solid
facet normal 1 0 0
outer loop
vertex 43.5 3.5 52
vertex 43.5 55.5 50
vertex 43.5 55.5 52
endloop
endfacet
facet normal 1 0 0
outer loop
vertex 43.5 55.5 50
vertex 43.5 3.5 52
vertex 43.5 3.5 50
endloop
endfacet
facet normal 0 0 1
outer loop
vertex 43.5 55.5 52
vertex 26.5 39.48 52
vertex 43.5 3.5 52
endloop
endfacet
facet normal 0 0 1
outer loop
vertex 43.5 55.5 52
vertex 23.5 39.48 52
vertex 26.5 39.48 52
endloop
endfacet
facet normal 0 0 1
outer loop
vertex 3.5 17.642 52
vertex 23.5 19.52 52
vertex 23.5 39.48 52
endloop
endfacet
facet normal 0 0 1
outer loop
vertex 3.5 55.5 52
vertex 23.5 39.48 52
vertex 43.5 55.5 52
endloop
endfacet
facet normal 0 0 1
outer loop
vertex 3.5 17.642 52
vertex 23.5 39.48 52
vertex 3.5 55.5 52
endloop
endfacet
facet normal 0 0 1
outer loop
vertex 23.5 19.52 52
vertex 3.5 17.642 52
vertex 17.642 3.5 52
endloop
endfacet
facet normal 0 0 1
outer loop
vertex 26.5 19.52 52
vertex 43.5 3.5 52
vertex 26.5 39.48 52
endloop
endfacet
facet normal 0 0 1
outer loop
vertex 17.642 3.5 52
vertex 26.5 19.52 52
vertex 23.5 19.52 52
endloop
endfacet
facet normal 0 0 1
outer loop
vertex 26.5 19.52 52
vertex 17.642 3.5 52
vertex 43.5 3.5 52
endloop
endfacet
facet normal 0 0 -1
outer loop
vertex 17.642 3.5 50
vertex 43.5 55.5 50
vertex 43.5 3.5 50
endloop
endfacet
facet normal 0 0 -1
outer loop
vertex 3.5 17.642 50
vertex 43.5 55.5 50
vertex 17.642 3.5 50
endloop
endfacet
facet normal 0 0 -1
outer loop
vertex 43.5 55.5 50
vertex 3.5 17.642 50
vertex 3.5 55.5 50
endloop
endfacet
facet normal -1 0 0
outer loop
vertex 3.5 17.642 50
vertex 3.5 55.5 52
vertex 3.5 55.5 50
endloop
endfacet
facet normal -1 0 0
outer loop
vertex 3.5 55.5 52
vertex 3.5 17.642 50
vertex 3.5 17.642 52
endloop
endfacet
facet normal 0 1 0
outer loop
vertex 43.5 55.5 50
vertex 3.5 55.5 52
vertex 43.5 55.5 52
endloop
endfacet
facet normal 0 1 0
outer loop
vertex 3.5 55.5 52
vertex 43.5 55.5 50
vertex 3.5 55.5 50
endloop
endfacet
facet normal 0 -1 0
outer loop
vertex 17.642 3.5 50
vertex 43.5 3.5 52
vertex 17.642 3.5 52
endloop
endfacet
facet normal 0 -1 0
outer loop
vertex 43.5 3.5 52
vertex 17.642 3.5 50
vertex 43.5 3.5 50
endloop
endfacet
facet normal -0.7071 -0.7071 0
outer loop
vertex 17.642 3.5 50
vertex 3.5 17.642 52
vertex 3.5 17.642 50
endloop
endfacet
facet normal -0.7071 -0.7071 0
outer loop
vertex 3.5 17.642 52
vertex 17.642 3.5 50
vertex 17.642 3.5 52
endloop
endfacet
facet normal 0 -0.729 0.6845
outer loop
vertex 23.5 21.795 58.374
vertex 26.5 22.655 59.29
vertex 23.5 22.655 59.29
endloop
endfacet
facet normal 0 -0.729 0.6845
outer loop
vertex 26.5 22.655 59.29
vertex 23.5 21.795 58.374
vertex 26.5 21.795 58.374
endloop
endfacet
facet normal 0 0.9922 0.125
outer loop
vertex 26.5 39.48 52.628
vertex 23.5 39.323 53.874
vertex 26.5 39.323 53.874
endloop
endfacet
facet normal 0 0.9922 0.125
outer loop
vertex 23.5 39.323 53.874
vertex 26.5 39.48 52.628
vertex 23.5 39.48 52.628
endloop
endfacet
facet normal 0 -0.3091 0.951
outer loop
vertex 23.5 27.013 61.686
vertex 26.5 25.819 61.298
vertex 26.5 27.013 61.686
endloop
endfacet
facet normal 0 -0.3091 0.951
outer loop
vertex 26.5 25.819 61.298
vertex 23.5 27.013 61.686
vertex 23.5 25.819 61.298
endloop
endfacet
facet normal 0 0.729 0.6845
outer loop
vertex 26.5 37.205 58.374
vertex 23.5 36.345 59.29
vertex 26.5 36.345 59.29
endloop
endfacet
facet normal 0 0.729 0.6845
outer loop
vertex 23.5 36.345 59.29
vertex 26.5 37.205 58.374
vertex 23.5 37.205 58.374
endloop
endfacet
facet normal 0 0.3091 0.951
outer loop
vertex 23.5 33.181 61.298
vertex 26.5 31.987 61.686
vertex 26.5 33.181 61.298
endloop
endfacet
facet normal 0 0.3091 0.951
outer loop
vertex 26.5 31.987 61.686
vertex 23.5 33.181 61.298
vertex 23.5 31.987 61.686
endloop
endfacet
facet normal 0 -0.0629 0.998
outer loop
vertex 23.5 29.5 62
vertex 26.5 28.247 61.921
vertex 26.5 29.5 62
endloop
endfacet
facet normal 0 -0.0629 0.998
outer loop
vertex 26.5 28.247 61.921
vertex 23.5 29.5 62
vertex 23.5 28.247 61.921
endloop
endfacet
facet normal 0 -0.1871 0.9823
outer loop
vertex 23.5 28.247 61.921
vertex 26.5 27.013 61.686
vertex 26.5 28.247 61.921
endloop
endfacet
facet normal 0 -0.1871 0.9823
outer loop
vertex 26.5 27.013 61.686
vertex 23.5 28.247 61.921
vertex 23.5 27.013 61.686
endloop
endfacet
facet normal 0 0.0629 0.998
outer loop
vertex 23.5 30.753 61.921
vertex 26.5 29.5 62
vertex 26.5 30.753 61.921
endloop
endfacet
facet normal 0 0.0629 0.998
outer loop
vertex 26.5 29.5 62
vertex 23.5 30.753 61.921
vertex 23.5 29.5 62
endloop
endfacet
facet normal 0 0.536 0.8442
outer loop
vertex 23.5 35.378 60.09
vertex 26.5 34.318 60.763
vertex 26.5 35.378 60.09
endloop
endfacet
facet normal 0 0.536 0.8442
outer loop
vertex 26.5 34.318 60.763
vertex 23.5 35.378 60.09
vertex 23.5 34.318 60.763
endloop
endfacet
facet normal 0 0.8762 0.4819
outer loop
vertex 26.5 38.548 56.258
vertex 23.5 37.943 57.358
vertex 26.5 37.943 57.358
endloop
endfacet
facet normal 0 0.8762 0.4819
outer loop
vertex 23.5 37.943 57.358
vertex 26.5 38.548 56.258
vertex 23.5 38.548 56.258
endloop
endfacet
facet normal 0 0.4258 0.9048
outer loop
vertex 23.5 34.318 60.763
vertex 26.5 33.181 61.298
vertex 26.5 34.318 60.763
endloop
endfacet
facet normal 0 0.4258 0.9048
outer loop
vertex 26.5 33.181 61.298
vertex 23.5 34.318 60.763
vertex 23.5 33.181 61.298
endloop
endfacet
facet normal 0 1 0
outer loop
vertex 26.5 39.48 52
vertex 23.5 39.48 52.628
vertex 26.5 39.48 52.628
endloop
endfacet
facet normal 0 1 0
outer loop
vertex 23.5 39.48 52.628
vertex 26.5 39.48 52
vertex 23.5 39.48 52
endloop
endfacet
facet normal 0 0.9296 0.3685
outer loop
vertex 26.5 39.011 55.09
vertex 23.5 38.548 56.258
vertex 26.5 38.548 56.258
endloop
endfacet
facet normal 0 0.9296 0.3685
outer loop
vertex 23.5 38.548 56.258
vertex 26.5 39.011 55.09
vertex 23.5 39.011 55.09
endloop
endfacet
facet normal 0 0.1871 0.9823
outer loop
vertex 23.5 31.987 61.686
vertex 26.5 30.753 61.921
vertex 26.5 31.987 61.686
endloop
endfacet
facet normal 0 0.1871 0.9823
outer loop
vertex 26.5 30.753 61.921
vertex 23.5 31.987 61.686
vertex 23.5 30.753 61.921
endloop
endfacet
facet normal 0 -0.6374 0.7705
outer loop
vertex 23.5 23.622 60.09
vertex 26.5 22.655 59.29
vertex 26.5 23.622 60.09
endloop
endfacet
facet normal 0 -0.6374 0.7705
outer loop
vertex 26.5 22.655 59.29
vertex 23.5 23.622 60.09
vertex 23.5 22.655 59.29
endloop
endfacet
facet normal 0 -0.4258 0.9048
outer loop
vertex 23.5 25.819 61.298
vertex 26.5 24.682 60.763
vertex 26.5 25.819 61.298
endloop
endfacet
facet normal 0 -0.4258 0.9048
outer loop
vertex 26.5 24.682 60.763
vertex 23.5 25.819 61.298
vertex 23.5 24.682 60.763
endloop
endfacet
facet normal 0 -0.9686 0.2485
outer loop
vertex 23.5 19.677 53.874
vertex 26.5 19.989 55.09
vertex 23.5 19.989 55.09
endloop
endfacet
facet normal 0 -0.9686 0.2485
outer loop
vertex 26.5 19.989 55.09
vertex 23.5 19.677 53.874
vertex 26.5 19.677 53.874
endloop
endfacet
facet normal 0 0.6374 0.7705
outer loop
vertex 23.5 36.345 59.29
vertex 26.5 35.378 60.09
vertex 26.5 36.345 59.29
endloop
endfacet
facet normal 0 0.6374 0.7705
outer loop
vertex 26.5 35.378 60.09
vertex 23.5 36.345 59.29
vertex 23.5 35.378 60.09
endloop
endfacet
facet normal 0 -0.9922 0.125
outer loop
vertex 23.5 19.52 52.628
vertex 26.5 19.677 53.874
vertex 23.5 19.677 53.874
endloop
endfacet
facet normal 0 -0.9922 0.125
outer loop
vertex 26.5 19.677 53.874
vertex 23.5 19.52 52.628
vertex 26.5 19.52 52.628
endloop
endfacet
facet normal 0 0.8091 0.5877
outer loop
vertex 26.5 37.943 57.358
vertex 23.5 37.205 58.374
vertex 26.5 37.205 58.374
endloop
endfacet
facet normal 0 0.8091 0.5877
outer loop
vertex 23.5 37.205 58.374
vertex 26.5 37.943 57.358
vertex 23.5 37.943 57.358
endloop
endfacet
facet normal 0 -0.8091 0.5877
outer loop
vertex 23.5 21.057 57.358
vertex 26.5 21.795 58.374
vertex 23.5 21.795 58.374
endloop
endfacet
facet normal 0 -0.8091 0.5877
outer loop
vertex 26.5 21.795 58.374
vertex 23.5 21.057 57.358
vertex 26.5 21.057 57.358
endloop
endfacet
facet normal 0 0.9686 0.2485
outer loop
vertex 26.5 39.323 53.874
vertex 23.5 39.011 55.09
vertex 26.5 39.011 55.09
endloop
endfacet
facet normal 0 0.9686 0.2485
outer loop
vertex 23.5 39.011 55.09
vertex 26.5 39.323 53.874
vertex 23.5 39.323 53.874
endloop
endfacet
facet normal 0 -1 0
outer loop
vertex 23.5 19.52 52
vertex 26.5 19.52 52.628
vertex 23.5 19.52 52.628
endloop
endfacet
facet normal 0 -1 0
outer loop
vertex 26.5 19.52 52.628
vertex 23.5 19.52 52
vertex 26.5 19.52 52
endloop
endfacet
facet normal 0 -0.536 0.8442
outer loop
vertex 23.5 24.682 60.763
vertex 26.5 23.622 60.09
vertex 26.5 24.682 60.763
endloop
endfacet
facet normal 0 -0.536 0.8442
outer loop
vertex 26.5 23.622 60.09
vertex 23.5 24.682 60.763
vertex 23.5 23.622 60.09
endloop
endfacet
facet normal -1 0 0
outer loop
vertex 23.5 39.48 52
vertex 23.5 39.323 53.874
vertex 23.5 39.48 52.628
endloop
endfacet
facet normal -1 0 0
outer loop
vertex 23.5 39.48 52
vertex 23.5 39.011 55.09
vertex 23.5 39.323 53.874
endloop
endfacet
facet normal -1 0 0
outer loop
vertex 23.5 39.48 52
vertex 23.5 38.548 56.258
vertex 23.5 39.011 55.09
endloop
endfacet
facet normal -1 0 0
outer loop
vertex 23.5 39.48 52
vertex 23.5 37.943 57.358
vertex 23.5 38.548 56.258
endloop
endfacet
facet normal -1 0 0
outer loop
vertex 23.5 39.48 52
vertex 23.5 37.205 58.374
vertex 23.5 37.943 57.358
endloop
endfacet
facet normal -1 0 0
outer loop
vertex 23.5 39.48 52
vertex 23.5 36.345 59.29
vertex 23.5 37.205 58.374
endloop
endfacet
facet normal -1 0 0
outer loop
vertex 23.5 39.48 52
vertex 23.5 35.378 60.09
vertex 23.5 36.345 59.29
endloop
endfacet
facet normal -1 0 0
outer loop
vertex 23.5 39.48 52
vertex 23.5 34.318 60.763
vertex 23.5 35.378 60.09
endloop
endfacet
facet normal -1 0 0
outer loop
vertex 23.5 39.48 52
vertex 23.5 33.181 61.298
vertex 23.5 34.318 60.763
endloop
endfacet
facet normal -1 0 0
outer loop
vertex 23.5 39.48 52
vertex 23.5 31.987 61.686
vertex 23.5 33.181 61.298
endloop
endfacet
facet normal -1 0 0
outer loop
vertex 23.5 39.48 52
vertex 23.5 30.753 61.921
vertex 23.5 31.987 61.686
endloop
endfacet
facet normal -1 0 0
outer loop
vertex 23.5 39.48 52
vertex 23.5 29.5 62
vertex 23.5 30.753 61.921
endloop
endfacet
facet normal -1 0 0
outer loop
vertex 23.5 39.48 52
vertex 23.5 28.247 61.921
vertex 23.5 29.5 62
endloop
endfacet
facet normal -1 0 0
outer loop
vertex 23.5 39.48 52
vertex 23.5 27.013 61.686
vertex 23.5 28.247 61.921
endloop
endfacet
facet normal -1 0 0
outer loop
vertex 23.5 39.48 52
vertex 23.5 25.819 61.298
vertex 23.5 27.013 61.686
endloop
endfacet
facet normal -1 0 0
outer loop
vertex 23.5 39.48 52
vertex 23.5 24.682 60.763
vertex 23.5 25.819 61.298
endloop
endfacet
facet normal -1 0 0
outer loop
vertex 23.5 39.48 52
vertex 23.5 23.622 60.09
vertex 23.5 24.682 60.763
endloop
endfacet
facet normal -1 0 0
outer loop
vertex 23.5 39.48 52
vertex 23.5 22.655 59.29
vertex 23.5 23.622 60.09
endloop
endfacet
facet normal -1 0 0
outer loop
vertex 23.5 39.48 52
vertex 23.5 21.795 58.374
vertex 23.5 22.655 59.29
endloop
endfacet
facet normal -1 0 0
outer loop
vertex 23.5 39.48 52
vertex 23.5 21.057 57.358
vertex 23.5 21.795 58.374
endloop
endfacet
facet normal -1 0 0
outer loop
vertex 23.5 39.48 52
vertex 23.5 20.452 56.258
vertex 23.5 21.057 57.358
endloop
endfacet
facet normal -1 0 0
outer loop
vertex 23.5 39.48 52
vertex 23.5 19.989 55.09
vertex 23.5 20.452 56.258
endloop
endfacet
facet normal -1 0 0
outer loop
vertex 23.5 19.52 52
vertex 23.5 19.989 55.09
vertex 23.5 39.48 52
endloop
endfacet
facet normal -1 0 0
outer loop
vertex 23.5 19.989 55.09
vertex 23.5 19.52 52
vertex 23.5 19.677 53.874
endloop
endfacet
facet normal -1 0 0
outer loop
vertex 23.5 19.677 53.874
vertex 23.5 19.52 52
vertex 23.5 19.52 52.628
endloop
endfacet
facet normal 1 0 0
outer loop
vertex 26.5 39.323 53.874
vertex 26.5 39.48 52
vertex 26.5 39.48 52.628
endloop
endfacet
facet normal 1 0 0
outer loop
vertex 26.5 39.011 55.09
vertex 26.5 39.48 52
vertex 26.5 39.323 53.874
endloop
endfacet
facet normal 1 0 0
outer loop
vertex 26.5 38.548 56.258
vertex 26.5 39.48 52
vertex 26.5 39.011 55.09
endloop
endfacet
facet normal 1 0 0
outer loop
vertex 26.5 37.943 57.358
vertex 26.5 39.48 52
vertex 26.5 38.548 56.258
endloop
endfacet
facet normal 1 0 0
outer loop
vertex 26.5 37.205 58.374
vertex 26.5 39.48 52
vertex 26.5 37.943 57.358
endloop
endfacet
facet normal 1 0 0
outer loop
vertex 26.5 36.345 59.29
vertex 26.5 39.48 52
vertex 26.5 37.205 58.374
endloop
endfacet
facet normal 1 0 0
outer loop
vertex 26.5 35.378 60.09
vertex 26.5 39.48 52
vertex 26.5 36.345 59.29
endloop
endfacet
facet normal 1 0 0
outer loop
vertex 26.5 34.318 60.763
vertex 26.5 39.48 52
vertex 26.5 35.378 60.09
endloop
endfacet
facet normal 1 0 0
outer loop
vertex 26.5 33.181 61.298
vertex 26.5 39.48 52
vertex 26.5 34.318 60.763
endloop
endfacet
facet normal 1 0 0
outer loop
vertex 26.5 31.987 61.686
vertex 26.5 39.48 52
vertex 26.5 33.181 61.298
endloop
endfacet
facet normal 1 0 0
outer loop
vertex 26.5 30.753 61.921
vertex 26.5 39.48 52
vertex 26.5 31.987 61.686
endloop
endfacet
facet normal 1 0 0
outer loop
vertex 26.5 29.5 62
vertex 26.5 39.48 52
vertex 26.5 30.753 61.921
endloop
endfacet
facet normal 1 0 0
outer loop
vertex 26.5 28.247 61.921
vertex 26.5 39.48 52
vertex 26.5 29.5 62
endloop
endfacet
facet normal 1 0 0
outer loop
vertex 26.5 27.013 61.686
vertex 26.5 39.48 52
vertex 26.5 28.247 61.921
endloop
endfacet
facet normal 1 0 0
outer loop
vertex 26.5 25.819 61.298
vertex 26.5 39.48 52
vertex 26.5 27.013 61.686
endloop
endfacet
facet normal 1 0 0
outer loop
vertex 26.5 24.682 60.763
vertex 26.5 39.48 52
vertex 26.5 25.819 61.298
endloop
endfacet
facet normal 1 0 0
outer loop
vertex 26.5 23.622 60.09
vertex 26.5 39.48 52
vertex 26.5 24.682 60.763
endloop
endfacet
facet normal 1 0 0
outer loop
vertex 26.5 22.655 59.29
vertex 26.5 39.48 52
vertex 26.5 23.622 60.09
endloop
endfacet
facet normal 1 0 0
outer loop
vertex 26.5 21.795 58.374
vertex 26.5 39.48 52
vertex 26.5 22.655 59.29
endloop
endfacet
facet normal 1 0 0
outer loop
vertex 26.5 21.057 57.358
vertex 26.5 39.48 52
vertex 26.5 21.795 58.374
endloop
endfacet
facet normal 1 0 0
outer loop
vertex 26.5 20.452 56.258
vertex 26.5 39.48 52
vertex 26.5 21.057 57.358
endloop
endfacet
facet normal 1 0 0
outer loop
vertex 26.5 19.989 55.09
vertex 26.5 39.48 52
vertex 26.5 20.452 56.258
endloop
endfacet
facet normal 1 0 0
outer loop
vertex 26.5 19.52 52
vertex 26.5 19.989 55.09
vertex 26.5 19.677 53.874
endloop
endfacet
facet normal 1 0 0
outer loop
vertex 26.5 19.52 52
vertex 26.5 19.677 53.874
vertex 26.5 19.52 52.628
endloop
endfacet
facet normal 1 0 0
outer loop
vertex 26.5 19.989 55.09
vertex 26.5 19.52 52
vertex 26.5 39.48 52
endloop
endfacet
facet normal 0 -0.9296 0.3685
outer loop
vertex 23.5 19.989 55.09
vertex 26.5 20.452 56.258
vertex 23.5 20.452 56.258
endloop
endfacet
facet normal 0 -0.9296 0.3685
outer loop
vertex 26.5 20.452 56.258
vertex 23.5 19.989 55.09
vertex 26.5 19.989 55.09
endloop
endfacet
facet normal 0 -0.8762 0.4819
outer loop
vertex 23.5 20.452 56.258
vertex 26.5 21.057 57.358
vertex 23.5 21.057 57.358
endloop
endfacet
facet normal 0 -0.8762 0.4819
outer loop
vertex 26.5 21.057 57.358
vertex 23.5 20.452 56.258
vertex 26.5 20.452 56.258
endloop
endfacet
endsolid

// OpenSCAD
// Wash Chamber V5
// Jeffery Moffitt
// jeffmoffitt@gmail.com
// December 22, 2015//Modified January 26, 2016//Modified February 11, 2016//Modified February 26, 2016//Modified July 1, 2016

module catch() {
    cube(size=([9,3,3]));
    translate([3,0,-3])cube(size=([3,3,3]));
}
//catch();

module case() {
    difference(){
        translate([0,0,0])cube(size=([47, 59, 50])); //Outside box 99
        translate([3,3,3])cube(size=([41, 53, 48])); // Inside 93
    }
    //Add ribs
    for (pos=[3:2:55]){
        union(){
            translate([0, pos, 0])cube(size=([5,1,43]));
            translate([42, pos, 0])cube(size=([5,1,43]));
        }
    }
   //Add symmetry breaking mark
    translate([49/2-9/2,59,42*3/4-3/2])catch();
}
//case();

module coverslip(){
    translate([4.5,0,0])rotate([0,90,0])cylinder(h=1, r=20, $fn=500);
}
//coverslip();

module latch(){
    union(){
        cube(size=([2, 1, 42/4 + 3/2 + 5]));
        translate([0,-1, 0])cube(size=([2, 1, 1.5]));
    }
} 
//latch();

module cover(){
    union(){//Add latches
        difference(){ //Create top plate
            cube(size=([40, 52, 2]));
            rotate([0,0,45])translate([-10,-10,-.5])cube(size=([20,20,3]));
        }
        translate([20,26,2])difference(){ //Create handle
            rotate([0,90,0])cylinder(h=3, r=10, $fn=50);
            translate([-1,-10,-20])cube(size=([5,20,20]));
        }
    }  
}
//translate([0,0,45])color("red")cover();

module washcontainer(){
    translate([25.5, 30, 0])difference(){
        cylinder(h=50,r=42, $fn=500);
        translate([0,0,-1])cylinder(h=52,r=40,$fn=500);
    }
}
//washcontainer();

//case();
//translate([47/2,2,23])rotate([0,0,90])coverslip();
//washcontainer();
translate([3.5,3.5,50])color("red")cover();
//cover();
